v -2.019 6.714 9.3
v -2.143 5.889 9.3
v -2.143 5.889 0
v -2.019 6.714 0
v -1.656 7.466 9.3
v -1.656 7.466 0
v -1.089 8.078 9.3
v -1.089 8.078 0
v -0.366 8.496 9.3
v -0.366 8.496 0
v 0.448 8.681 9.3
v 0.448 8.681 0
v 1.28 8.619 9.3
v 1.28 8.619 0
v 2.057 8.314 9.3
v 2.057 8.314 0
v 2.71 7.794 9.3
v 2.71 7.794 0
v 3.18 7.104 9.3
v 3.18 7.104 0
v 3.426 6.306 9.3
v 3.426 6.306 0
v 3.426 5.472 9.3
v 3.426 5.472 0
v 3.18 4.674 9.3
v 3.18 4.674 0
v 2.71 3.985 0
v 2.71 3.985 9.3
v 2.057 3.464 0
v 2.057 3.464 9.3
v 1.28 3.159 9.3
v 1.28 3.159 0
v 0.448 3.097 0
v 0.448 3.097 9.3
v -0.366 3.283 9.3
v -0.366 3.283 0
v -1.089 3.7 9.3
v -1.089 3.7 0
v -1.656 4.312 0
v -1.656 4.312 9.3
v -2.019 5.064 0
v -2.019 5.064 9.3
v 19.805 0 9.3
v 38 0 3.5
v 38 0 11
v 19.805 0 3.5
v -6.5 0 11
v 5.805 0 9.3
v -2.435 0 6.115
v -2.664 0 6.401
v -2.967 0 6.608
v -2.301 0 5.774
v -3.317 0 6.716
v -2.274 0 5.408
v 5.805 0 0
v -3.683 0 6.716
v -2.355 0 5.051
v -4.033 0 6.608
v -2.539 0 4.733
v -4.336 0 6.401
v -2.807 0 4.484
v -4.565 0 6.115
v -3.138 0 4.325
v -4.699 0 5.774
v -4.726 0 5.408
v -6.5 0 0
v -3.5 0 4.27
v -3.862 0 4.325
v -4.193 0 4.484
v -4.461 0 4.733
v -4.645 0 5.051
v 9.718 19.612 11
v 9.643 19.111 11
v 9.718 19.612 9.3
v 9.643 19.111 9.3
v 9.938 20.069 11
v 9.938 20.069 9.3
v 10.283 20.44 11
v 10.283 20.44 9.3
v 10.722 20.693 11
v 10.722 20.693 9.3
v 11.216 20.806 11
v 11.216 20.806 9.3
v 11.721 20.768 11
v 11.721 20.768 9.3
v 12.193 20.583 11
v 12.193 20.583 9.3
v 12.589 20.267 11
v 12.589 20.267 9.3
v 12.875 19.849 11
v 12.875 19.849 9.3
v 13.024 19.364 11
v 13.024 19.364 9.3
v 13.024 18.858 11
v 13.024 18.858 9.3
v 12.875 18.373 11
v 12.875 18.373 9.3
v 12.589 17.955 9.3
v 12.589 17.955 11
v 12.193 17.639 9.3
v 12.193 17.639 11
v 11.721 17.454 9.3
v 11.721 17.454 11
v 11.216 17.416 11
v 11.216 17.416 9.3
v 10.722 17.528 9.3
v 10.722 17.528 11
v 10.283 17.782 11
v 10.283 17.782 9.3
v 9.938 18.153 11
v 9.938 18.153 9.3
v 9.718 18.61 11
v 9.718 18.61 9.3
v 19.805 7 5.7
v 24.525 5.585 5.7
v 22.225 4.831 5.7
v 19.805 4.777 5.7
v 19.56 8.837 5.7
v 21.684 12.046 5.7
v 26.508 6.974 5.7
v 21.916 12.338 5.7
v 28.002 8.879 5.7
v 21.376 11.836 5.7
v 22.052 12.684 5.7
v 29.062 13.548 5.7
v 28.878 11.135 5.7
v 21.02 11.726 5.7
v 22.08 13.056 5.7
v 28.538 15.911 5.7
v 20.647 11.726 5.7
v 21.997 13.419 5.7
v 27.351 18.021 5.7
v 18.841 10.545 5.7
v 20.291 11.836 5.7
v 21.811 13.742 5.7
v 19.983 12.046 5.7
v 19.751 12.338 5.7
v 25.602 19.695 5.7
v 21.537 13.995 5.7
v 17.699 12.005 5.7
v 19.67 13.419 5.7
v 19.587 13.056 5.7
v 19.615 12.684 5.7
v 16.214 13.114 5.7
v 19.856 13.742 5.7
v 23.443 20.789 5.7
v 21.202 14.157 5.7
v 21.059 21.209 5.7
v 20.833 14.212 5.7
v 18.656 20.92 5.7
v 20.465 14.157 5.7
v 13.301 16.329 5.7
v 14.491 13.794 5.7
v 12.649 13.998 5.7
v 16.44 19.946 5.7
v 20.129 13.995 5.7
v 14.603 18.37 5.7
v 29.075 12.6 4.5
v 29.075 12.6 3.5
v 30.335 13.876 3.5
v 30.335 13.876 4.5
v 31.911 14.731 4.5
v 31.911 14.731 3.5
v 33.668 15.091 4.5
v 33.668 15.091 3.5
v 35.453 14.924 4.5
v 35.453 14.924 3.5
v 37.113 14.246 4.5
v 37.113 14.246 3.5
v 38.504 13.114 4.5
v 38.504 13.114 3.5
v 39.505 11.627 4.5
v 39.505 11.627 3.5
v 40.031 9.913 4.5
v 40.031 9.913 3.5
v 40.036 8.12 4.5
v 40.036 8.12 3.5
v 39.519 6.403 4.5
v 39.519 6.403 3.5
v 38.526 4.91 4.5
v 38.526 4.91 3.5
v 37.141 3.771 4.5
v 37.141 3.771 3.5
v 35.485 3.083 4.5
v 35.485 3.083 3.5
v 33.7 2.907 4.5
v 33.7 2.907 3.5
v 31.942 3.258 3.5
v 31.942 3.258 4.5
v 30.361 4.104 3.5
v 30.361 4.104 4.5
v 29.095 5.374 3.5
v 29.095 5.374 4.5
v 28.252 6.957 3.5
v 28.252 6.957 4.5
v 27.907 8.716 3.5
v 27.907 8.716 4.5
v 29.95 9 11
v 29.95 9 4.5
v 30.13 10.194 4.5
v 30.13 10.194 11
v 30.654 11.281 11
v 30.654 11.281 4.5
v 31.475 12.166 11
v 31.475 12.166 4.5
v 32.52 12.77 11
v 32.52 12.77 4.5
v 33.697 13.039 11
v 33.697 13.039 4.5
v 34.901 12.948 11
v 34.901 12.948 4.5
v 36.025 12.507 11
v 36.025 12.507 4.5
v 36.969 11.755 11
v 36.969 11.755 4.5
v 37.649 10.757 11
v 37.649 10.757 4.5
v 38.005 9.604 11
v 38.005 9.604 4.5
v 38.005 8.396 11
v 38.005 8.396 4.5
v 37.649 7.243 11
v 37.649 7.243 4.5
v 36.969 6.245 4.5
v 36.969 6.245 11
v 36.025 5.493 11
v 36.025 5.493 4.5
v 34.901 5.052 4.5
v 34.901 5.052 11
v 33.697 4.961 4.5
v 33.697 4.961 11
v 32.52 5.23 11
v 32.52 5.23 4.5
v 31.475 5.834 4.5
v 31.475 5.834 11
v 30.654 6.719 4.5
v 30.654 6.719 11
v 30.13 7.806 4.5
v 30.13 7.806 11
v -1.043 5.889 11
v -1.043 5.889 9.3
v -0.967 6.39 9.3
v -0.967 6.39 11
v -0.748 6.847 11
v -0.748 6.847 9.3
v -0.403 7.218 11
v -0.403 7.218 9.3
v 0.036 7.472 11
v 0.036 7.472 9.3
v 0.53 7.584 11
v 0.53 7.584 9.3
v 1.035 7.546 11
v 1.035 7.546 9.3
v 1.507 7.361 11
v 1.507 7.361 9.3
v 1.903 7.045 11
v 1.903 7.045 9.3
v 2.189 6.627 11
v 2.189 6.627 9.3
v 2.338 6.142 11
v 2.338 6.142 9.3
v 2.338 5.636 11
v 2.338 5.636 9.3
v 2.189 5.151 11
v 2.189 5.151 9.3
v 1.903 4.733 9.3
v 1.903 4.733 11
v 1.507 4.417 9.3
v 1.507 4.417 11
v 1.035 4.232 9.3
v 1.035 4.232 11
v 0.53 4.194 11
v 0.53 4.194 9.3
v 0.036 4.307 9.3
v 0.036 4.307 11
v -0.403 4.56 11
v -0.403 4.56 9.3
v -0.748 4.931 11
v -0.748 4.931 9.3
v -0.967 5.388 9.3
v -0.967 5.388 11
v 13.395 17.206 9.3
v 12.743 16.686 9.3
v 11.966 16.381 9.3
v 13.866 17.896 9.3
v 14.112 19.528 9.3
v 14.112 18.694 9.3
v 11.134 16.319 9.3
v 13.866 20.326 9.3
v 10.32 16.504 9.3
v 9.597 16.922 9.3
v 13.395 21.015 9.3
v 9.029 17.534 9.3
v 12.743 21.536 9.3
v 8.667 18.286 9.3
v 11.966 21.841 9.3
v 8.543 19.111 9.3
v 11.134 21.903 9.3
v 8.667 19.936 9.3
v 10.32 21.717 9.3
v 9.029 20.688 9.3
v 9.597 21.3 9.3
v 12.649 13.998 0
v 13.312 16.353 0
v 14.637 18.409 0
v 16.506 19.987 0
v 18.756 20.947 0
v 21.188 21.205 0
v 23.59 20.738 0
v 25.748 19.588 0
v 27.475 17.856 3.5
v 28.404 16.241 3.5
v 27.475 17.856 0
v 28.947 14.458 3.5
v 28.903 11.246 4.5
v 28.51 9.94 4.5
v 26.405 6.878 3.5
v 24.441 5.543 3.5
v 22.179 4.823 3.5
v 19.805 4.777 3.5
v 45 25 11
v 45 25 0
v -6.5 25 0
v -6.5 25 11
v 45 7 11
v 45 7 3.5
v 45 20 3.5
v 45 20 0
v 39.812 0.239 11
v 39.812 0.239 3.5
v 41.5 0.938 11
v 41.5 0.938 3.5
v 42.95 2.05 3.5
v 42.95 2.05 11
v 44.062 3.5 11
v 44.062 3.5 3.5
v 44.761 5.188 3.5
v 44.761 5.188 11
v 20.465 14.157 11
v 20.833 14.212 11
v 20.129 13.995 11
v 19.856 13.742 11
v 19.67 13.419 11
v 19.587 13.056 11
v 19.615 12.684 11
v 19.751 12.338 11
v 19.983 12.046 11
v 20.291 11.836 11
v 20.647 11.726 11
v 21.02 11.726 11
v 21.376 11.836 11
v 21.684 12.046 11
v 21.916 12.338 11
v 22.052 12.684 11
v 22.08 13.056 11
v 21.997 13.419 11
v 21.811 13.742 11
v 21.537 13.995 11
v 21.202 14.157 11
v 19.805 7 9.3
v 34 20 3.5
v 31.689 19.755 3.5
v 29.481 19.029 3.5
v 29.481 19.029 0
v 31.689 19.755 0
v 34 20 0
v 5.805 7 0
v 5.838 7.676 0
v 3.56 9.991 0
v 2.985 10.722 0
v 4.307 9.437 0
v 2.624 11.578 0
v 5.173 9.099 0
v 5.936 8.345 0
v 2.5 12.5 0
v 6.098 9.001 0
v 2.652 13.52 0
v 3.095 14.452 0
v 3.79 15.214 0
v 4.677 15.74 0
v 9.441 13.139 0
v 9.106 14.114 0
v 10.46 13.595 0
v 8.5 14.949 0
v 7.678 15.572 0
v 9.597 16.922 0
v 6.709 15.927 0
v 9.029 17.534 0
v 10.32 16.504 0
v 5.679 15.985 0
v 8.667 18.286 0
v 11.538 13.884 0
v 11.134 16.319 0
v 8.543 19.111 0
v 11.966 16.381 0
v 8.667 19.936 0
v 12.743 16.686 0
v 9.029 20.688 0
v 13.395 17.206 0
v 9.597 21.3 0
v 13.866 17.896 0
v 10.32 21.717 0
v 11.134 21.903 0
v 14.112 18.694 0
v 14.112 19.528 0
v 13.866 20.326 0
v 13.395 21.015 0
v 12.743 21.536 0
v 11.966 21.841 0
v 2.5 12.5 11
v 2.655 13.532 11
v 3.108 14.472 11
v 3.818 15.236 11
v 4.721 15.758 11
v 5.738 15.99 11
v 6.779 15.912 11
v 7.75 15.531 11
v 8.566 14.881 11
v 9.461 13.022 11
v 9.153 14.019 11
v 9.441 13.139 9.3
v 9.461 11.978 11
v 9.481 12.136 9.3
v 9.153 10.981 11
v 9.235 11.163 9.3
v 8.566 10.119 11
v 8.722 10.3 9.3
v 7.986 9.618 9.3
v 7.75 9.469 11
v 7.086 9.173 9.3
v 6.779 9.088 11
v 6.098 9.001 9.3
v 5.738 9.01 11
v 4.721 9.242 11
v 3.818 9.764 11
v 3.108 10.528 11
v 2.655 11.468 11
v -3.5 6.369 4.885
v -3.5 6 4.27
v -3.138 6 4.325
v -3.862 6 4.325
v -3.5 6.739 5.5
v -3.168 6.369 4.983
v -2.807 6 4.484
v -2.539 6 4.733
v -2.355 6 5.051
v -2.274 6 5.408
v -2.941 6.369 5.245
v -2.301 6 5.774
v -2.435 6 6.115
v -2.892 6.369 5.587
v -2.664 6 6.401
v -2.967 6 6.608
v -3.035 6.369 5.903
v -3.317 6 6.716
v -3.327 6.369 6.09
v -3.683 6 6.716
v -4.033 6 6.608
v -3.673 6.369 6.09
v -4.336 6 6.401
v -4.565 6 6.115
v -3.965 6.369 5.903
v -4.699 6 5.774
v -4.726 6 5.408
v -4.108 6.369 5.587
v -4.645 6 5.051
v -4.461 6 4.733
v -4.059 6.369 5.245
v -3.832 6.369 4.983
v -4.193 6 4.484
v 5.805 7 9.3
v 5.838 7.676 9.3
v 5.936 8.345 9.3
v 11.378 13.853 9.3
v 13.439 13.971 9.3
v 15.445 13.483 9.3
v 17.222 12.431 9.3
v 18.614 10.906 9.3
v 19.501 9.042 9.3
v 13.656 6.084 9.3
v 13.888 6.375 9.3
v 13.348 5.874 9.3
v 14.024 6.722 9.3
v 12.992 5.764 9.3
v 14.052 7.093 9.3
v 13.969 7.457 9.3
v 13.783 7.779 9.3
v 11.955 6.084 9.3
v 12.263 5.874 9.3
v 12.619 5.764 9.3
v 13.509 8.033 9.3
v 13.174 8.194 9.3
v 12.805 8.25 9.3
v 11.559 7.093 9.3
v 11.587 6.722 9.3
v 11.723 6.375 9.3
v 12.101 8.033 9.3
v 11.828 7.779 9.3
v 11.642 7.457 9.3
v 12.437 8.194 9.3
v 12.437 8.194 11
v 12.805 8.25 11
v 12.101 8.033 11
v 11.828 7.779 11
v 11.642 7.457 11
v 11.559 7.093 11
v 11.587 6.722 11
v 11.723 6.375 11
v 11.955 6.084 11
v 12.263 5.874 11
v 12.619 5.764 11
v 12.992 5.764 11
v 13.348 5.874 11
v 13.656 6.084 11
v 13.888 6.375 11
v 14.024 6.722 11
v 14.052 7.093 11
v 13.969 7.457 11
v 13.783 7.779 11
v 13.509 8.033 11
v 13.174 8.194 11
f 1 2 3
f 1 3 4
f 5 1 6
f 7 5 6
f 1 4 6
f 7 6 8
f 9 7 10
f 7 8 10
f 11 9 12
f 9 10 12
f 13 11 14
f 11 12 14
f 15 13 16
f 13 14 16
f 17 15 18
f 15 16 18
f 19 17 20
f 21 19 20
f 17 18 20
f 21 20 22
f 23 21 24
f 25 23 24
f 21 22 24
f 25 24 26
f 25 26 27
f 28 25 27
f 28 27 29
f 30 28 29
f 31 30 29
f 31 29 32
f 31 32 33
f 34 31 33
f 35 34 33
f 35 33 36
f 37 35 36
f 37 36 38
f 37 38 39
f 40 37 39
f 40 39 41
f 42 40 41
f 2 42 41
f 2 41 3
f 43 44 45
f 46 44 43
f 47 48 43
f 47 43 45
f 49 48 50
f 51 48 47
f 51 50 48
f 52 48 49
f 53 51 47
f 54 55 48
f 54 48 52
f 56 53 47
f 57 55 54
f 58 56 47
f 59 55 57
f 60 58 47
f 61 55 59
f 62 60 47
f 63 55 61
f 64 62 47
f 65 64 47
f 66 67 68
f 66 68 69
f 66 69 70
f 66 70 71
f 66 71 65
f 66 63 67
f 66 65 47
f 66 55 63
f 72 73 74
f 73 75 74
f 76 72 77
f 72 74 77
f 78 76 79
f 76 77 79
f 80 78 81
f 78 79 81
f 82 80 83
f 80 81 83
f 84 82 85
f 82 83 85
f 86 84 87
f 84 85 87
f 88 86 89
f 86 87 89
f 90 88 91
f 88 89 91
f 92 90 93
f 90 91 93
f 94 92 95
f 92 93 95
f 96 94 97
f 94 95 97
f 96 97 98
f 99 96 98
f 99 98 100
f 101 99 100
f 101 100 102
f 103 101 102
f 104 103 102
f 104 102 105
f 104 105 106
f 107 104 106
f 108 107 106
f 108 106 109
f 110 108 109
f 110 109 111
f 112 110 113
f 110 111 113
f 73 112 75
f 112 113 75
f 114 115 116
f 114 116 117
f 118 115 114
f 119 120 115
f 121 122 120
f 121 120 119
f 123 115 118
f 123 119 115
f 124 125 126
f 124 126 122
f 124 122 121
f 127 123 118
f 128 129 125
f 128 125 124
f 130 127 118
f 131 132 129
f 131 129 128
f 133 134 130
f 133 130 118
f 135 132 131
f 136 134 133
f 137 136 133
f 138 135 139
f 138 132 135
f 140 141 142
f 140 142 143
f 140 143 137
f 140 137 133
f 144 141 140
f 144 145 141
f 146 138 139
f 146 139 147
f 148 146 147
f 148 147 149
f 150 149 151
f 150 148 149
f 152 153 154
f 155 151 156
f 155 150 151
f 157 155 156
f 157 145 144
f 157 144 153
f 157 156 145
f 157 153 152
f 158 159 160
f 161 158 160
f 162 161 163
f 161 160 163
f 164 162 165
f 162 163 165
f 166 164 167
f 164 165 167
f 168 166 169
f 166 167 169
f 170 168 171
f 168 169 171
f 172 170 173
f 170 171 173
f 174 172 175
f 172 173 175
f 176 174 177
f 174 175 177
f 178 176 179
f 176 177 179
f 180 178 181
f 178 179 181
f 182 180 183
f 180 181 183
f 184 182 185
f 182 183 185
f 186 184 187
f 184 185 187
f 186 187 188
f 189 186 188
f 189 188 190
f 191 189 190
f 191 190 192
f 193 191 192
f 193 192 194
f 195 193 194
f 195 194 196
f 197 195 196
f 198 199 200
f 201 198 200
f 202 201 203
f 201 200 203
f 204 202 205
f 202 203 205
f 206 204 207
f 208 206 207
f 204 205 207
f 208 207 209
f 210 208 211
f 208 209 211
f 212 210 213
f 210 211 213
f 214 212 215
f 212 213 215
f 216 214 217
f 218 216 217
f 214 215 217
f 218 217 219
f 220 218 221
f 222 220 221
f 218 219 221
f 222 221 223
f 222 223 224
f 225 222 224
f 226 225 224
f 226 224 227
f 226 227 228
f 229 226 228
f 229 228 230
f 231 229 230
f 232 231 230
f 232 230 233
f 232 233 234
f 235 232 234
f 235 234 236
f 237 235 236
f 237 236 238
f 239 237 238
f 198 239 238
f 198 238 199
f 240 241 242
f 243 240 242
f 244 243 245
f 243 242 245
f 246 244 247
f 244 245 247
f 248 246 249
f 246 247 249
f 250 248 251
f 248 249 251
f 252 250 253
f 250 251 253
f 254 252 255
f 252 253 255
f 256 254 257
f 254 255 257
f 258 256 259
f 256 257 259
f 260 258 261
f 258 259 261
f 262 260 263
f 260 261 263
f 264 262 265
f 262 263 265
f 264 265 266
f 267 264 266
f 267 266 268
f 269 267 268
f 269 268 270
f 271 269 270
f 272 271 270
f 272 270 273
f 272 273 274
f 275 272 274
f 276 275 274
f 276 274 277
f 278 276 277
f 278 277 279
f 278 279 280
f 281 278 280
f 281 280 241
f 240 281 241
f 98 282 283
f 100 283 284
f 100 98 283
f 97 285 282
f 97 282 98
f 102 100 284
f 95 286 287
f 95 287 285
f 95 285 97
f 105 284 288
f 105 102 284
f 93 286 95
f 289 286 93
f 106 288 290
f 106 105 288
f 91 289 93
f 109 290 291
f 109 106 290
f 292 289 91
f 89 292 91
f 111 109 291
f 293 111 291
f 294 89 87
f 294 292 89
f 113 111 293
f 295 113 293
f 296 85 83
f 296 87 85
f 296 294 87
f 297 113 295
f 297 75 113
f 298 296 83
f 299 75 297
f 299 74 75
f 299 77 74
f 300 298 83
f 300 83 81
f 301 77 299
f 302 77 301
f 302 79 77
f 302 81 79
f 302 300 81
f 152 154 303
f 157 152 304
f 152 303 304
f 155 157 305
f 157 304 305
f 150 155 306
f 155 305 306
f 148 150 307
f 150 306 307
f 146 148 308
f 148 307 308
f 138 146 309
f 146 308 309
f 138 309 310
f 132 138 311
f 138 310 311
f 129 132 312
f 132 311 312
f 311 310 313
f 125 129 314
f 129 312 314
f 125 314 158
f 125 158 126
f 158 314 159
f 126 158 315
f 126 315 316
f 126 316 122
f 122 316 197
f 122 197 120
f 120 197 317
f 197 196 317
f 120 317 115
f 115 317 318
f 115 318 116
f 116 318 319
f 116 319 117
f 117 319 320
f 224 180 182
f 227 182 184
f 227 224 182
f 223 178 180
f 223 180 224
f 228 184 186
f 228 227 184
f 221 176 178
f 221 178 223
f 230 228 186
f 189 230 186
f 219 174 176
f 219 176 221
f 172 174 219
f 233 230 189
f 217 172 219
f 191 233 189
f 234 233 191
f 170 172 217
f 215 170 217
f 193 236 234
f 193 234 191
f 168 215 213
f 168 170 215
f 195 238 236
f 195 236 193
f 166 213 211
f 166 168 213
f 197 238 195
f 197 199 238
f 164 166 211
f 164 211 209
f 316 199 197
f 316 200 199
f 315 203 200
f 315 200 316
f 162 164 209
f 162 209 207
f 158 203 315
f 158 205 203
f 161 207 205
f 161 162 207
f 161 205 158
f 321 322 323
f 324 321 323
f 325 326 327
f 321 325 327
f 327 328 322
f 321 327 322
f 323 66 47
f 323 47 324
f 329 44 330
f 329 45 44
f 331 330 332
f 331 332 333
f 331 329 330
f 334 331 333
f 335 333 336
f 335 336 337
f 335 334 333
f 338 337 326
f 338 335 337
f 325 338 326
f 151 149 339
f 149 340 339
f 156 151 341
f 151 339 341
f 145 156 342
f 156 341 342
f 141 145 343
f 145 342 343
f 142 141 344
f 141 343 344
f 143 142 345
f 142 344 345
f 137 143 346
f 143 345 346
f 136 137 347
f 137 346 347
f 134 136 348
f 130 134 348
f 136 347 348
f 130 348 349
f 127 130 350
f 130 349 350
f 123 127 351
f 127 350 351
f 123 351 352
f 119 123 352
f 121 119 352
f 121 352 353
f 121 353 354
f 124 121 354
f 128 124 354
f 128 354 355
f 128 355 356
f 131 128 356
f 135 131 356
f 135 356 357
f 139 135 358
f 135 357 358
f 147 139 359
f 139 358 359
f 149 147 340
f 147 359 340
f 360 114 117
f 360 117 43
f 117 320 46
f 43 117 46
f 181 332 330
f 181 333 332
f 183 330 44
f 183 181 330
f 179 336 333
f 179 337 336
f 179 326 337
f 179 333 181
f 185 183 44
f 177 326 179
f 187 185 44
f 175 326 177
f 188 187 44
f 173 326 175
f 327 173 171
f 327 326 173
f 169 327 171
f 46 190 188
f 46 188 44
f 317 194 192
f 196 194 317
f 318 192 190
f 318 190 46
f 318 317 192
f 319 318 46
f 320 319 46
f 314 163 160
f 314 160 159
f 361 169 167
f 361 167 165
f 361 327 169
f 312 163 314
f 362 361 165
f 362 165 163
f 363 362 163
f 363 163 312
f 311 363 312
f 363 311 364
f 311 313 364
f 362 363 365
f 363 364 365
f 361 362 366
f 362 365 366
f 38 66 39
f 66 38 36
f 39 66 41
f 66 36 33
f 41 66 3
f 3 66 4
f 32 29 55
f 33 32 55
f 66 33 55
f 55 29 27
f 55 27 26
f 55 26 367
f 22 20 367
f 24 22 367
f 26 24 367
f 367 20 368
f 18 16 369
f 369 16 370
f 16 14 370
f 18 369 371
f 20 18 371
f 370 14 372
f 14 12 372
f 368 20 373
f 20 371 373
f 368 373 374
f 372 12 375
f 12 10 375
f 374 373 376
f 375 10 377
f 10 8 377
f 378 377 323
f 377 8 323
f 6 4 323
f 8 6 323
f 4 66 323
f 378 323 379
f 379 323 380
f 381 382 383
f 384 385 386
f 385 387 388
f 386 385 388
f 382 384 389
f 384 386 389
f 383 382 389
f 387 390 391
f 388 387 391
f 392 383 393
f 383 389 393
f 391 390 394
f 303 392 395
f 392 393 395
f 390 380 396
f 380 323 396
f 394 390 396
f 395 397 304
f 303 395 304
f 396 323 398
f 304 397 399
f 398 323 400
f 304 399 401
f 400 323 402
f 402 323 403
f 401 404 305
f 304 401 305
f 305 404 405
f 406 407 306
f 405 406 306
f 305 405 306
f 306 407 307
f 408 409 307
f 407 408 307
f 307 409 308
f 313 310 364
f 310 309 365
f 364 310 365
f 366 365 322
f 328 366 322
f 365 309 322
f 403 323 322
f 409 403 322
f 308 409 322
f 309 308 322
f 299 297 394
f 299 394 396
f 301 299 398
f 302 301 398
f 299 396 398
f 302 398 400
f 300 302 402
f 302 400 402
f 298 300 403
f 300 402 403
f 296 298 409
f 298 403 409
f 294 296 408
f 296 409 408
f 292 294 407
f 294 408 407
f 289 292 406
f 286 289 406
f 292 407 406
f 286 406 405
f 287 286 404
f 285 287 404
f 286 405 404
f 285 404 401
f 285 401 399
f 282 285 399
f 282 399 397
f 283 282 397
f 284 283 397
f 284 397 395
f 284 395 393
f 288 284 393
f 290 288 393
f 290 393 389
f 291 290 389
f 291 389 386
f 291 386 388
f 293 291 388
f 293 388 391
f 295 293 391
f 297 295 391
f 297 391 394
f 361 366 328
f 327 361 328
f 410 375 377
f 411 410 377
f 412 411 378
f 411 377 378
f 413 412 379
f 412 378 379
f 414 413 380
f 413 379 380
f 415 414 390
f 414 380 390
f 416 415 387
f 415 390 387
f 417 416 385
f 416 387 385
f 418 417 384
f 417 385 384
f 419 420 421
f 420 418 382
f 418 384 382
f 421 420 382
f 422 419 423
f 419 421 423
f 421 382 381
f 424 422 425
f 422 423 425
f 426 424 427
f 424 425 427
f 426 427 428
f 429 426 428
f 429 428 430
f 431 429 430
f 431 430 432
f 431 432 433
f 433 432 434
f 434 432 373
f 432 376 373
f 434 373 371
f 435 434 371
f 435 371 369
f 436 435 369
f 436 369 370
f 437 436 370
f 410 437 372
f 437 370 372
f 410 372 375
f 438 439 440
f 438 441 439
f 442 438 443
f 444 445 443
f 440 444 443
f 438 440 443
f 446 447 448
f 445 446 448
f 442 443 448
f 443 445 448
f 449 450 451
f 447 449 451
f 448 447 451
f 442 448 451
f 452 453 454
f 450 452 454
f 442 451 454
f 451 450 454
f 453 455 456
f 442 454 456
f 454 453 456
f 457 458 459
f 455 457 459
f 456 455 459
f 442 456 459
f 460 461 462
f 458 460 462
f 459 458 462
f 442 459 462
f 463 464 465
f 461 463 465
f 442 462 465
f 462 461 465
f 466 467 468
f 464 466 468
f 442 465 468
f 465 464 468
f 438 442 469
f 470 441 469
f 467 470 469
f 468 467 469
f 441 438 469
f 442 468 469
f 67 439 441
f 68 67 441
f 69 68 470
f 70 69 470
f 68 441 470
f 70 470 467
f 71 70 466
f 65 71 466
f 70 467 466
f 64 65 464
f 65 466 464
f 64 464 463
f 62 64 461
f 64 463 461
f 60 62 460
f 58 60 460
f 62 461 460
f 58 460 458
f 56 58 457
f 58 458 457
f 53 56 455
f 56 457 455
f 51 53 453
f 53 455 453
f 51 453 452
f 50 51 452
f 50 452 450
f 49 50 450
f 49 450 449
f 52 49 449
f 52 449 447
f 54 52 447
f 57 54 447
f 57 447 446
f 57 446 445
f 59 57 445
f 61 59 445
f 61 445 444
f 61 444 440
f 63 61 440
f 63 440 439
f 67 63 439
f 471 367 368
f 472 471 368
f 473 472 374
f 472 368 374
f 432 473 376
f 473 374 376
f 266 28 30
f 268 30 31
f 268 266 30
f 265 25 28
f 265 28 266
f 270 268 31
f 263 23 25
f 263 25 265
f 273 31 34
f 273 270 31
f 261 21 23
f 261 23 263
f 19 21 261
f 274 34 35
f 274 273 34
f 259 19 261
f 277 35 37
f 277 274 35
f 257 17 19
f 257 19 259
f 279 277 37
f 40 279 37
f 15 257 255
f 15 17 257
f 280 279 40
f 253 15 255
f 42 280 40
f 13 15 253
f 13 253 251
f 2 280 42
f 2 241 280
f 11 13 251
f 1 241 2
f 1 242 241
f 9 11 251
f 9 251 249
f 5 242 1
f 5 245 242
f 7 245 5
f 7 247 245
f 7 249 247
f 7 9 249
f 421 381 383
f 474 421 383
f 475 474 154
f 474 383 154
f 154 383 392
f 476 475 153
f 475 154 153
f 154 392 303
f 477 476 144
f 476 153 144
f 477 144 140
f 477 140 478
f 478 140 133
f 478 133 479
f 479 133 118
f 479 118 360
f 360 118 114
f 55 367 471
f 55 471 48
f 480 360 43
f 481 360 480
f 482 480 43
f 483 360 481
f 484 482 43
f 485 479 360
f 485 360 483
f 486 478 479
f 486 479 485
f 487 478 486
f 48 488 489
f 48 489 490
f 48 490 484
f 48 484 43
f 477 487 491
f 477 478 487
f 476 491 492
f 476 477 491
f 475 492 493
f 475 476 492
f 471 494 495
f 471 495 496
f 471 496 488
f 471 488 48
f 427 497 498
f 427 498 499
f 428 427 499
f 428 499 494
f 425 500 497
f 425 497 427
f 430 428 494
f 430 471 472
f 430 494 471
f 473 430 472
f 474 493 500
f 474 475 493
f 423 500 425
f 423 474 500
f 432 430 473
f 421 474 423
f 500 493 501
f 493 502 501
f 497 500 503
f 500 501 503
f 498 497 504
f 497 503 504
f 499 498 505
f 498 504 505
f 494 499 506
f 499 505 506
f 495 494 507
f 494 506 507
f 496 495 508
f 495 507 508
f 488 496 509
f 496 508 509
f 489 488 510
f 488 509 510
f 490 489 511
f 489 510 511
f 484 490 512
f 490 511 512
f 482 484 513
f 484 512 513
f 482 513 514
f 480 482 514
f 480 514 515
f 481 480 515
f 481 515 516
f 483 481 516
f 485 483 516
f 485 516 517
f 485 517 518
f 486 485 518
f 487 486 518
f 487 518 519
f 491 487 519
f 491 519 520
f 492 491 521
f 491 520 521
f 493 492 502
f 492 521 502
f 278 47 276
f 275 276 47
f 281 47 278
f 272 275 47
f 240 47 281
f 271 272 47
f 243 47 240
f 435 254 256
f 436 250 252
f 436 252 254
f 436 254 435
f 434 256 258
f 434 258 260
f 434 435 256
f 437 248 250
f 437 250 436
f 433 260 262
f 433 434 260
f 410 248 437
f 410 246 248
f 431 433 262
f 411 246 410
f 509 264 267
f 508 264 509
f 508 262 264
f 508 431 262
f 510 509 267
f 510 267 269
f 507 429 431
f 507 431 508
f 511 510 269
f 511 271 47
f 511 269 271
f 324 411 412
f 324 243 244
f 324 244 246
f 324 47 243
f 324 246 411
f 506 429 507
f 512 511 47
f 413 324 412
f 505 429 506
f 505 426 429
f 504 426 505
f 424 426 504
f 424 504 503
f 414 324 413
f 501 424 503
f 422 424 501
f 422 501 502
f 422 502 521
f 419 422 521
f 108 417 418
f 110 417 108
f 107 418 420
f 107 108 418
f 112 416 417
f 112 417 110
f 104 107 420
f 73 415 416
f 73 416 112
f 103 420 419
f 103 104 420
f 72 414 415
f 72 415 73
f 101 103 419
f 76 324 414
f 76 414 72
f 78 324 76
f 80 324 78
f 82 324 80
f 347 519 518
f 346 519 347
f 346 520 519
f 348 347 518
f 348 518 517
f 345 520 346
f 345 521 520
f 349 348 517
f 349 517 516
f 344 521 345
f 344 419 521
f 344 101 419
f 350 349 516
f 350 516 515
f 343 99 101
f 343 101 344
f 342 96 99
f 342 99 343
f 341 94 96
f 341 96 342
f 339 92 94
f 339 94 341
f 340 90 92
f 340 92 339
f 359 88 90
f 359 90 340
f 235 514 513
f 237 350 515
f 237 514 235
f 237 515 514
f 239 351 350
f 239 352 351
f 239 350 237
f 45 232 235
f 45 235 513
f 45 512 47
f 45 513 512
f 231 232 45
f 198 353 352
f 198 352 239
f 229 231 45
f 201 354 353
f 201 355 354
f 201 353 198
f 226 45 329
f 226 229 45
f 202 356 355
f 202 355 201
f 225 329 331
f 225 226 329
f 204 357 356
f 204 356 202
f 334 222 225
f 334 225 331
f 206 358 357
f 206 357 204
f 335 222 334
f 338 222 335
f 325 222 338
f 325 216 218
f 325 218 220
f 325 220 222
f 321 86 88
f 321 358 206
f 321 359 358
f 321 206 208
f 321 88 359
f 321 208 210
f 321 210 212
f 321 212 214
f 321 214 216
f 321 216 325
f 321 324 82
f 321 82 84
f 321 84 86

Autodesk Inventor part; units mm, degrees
ref_plane "YZ Plane" through (0, 0, 0) normal (1, 0, 0) x (0, 1, 0)
ref_plane "XZ Plane" through (0, 0, 0) normal (0, 1, 0) x (-1, 0, 0)
ref_plane "XY Plane" through (0, 0, 0) normal (0, 0, 1) x (1, 0, 0)
sketch "Sketch1" plane through (0, 0, 0) normal (0, 0, 1) x (1, 0, 0)
  line L0 (45, 0) -> (-6.5, 0) projected
  line L1 (-6.5, 0) -> (-6.5, 25) projected
  line L2 (45, 25) -> (-6.5, 25) projected
  line L3 (45, 0) -> (45, 25) projected
  circle A0 centre (12.8053, 7) radius 1.25 projected
  circle A1 centre (20.8333, 12.9625) radius 1.25 projected
  circle A2 centre (34, 9) radius 3 projected
extrude "Bryla" add sketch "Sketch1" along normal blind 11 contours L0 L1 L2 L3 | A0 | A1 | A2
sketch "Sketch3" plane through (0, 0, 0) normal (0, 0, -1) x (-1, 0, 0)
  circle A0 centre (-6, 12.5) radius 3.5
  circle A1 centre (-12.8053, 7) radius 7
  circle A2 centre (-20.8333, 12.9625) radius 8.25
  circle A3 centre (-34, 9) radius 11
  circle A4 centre (-34, 9) radius 4.05
  circle A5 centre (-34, 9) radius 6.1
  line L0 (-6, 12.5) -> (-12.8053, 7) construction
  line L1 (-12.8053, 7) -> (-20.8333, 12.9625) construction
  line L2 (-20.8333, 12.9625) -> (-34, 9) construction
  line L3 (-11.3429, 19.1109) -> (-0.6571, 5.8891) construction
  circle A6 centre (-0.6571, 5.8891) radius 1.7
  circle A7 centre (-11.3429, 19.1109) radius 1.7
  circle A8 centre (-11.3429, 19.1109) radius 2.8
  circle A9 centre (-0.6571, 5.8891) radius 2.8
  line L4 (6.5, 25) -> (6.5, 0) construction
  line L5 (6.5, 0) -> (-45, 0) construction
  line L6 (-45, 0) -> (-45, 25) construction
  line L7 (-34, 20) -> (-45, 20)
  line L8 (-45, 20) -> (-45, 0)
  line L9 (6.5, 0) -> (-45, 0) projected
  line L10 (-40.3246, 0) -> (-45, 0)
  line L11 (-27.6754, 0) -> (-23, 0)
  line L12 (-23, 0) -> (-23, 9)
  line L13 (-19.8053, 7) -> (-19.8053, 0)
  line L14 (-5.8053, 7) -> (-5.8053, 0)
  line L15 (-23, 0) -> (-19.8053, 0)
  line L16 (-29.0833, 12.9625) -> (-29.0833, 0)
  line L17 (-29.0833, 0) -> (-27.6754, 0)
  point P0 (-27.9066, 8.7162)
  point P1 (-29.0753, 12.5997)
  point P2 (-19.4597, 4.8276)
  point P3 (-22.8938, 18.8508)
  point P4 (-23.6713, 5.216)
  point P5 (-25.7685, 19.5736)
  point P6 (-12.819, 14.9204)
  point P7 (-27.4753, 17.856)
  point P8 (-20.5208, 12.676)
  point P9 (-12.6486, 13.9982)
  point P10 (-18.4098, 11.1941)
  point P11 (-8.5508, 12.5587)
  point P12 (-1.1315, 7.6691)
  point P13 (-9.5, 12.5)
  point P14 (-2.6315, 11.5495)
  point P15 (-9.4412, 13.1386)
  point P16 (-6.1553, 9.4162)
  point P17 (-8.5736, 18.697)
  point P18 (-9.3, 21.0258)
  point P19 (-6.0975, 9.0014)
  point P20 (-27.6754, 0)
  point P21 (-12.8053, 0)
  point P22 (-19.8053, 4.7768)
  point P23 (-23, 5.0021)
  dimension "d20" = 7
  dimension "d21" = 14
  dimension "d22" = 16.5
  dimension "d23" = 22
  dimension "d24" = 12.2
  dimension "d25" = 8.1
  dimension "d26" = 8.75
  dimension "d27" = 10
  dimension "d28" = 13.75
  dimension "d59" = 5.6
  dimension "d60" = 3.4
  dimension "d61" = 17
  dimension "d65" = 12.5
  dimension "d66" = 12.5
  dimension "d68" = 11
  dimension "d69" = 9
extrude "Przelot" cut sketch "Sketch3" against normal through all contours A0 A1 | A1 A0 | A4 | A6 | A7
extrude "kolo3" cut sketch "Sketch3" against normal blind 3.5 contours A1 A0 | A3 A2 A5 | A2 L16 A5 L9 A3 | L13 L9 L12 A2 | A2 A5 L16 | L12 A2 A3 | A3 L8 L7 | L12 L9 A3 A2 | A5 A2 | A2 A5 L16 | L16 A5 | A3 L9 L16 A5 A2 | A3 L9 L8 | A3 L9 | A4 picked at (-7.468, 10.5481)
extrude "kolo1" cut sketch "Sketch3" against normal blind 9.3 contours A0 A1 | A1 A0 | A0 A1 A2 | A2 A1 | L14 L9 A1 | A1 A2 L13 | L9 L13 A2 A1
extrude "kolo2" cut sketch "Sketch3" against normal blind 5.7 contours A2 A1 | A1 L13 A2 L12 A3 | A1 A2 L13 | A3 A2 A5 | L12 A2 A3 | A5 A2
hole "osieMale" at (20.8333, 12.9625, 0) at (12.8053, 7, 0) direction (0, 0, 1) diameter 2.5 end through all
extrude "kolnierzLozyska" cut sketch "Sketch3" against normal blind 1 from surface at -3.5 contours A2 A5 L16 | L16 A5 picked at (-28.8319, 8.8586)
extrude "lbySrob" cut sketch "Sketch3" against normal up to surface (9.3 mm away) contours A6 | A7 | A8 | A9
sketch "Sketch5" plane through (-6.5, 0, 11) normal (0, -1, 0) x (1, 0, 0)
  line L0 (0, -11) -> (0, 0) construction
  point P0 (6.5, -11)
  point P1 (3, -5.5)
  point P2 (0, -5.5)
  dimension "d71" = 3
hole "Hole3" at (-3.5, 0, 5.5) direction (0, 1, 0) diameter 2.459 depth 6 tip angle 118 thread size "M3x0.5" class "6H" standard "ISO Metric profile"
fillet "Fillet1" radius 7 1 edges at (45, 0, 7.25)
properties part number "MocowaniePrzekladni_CPY_3DPrint"
